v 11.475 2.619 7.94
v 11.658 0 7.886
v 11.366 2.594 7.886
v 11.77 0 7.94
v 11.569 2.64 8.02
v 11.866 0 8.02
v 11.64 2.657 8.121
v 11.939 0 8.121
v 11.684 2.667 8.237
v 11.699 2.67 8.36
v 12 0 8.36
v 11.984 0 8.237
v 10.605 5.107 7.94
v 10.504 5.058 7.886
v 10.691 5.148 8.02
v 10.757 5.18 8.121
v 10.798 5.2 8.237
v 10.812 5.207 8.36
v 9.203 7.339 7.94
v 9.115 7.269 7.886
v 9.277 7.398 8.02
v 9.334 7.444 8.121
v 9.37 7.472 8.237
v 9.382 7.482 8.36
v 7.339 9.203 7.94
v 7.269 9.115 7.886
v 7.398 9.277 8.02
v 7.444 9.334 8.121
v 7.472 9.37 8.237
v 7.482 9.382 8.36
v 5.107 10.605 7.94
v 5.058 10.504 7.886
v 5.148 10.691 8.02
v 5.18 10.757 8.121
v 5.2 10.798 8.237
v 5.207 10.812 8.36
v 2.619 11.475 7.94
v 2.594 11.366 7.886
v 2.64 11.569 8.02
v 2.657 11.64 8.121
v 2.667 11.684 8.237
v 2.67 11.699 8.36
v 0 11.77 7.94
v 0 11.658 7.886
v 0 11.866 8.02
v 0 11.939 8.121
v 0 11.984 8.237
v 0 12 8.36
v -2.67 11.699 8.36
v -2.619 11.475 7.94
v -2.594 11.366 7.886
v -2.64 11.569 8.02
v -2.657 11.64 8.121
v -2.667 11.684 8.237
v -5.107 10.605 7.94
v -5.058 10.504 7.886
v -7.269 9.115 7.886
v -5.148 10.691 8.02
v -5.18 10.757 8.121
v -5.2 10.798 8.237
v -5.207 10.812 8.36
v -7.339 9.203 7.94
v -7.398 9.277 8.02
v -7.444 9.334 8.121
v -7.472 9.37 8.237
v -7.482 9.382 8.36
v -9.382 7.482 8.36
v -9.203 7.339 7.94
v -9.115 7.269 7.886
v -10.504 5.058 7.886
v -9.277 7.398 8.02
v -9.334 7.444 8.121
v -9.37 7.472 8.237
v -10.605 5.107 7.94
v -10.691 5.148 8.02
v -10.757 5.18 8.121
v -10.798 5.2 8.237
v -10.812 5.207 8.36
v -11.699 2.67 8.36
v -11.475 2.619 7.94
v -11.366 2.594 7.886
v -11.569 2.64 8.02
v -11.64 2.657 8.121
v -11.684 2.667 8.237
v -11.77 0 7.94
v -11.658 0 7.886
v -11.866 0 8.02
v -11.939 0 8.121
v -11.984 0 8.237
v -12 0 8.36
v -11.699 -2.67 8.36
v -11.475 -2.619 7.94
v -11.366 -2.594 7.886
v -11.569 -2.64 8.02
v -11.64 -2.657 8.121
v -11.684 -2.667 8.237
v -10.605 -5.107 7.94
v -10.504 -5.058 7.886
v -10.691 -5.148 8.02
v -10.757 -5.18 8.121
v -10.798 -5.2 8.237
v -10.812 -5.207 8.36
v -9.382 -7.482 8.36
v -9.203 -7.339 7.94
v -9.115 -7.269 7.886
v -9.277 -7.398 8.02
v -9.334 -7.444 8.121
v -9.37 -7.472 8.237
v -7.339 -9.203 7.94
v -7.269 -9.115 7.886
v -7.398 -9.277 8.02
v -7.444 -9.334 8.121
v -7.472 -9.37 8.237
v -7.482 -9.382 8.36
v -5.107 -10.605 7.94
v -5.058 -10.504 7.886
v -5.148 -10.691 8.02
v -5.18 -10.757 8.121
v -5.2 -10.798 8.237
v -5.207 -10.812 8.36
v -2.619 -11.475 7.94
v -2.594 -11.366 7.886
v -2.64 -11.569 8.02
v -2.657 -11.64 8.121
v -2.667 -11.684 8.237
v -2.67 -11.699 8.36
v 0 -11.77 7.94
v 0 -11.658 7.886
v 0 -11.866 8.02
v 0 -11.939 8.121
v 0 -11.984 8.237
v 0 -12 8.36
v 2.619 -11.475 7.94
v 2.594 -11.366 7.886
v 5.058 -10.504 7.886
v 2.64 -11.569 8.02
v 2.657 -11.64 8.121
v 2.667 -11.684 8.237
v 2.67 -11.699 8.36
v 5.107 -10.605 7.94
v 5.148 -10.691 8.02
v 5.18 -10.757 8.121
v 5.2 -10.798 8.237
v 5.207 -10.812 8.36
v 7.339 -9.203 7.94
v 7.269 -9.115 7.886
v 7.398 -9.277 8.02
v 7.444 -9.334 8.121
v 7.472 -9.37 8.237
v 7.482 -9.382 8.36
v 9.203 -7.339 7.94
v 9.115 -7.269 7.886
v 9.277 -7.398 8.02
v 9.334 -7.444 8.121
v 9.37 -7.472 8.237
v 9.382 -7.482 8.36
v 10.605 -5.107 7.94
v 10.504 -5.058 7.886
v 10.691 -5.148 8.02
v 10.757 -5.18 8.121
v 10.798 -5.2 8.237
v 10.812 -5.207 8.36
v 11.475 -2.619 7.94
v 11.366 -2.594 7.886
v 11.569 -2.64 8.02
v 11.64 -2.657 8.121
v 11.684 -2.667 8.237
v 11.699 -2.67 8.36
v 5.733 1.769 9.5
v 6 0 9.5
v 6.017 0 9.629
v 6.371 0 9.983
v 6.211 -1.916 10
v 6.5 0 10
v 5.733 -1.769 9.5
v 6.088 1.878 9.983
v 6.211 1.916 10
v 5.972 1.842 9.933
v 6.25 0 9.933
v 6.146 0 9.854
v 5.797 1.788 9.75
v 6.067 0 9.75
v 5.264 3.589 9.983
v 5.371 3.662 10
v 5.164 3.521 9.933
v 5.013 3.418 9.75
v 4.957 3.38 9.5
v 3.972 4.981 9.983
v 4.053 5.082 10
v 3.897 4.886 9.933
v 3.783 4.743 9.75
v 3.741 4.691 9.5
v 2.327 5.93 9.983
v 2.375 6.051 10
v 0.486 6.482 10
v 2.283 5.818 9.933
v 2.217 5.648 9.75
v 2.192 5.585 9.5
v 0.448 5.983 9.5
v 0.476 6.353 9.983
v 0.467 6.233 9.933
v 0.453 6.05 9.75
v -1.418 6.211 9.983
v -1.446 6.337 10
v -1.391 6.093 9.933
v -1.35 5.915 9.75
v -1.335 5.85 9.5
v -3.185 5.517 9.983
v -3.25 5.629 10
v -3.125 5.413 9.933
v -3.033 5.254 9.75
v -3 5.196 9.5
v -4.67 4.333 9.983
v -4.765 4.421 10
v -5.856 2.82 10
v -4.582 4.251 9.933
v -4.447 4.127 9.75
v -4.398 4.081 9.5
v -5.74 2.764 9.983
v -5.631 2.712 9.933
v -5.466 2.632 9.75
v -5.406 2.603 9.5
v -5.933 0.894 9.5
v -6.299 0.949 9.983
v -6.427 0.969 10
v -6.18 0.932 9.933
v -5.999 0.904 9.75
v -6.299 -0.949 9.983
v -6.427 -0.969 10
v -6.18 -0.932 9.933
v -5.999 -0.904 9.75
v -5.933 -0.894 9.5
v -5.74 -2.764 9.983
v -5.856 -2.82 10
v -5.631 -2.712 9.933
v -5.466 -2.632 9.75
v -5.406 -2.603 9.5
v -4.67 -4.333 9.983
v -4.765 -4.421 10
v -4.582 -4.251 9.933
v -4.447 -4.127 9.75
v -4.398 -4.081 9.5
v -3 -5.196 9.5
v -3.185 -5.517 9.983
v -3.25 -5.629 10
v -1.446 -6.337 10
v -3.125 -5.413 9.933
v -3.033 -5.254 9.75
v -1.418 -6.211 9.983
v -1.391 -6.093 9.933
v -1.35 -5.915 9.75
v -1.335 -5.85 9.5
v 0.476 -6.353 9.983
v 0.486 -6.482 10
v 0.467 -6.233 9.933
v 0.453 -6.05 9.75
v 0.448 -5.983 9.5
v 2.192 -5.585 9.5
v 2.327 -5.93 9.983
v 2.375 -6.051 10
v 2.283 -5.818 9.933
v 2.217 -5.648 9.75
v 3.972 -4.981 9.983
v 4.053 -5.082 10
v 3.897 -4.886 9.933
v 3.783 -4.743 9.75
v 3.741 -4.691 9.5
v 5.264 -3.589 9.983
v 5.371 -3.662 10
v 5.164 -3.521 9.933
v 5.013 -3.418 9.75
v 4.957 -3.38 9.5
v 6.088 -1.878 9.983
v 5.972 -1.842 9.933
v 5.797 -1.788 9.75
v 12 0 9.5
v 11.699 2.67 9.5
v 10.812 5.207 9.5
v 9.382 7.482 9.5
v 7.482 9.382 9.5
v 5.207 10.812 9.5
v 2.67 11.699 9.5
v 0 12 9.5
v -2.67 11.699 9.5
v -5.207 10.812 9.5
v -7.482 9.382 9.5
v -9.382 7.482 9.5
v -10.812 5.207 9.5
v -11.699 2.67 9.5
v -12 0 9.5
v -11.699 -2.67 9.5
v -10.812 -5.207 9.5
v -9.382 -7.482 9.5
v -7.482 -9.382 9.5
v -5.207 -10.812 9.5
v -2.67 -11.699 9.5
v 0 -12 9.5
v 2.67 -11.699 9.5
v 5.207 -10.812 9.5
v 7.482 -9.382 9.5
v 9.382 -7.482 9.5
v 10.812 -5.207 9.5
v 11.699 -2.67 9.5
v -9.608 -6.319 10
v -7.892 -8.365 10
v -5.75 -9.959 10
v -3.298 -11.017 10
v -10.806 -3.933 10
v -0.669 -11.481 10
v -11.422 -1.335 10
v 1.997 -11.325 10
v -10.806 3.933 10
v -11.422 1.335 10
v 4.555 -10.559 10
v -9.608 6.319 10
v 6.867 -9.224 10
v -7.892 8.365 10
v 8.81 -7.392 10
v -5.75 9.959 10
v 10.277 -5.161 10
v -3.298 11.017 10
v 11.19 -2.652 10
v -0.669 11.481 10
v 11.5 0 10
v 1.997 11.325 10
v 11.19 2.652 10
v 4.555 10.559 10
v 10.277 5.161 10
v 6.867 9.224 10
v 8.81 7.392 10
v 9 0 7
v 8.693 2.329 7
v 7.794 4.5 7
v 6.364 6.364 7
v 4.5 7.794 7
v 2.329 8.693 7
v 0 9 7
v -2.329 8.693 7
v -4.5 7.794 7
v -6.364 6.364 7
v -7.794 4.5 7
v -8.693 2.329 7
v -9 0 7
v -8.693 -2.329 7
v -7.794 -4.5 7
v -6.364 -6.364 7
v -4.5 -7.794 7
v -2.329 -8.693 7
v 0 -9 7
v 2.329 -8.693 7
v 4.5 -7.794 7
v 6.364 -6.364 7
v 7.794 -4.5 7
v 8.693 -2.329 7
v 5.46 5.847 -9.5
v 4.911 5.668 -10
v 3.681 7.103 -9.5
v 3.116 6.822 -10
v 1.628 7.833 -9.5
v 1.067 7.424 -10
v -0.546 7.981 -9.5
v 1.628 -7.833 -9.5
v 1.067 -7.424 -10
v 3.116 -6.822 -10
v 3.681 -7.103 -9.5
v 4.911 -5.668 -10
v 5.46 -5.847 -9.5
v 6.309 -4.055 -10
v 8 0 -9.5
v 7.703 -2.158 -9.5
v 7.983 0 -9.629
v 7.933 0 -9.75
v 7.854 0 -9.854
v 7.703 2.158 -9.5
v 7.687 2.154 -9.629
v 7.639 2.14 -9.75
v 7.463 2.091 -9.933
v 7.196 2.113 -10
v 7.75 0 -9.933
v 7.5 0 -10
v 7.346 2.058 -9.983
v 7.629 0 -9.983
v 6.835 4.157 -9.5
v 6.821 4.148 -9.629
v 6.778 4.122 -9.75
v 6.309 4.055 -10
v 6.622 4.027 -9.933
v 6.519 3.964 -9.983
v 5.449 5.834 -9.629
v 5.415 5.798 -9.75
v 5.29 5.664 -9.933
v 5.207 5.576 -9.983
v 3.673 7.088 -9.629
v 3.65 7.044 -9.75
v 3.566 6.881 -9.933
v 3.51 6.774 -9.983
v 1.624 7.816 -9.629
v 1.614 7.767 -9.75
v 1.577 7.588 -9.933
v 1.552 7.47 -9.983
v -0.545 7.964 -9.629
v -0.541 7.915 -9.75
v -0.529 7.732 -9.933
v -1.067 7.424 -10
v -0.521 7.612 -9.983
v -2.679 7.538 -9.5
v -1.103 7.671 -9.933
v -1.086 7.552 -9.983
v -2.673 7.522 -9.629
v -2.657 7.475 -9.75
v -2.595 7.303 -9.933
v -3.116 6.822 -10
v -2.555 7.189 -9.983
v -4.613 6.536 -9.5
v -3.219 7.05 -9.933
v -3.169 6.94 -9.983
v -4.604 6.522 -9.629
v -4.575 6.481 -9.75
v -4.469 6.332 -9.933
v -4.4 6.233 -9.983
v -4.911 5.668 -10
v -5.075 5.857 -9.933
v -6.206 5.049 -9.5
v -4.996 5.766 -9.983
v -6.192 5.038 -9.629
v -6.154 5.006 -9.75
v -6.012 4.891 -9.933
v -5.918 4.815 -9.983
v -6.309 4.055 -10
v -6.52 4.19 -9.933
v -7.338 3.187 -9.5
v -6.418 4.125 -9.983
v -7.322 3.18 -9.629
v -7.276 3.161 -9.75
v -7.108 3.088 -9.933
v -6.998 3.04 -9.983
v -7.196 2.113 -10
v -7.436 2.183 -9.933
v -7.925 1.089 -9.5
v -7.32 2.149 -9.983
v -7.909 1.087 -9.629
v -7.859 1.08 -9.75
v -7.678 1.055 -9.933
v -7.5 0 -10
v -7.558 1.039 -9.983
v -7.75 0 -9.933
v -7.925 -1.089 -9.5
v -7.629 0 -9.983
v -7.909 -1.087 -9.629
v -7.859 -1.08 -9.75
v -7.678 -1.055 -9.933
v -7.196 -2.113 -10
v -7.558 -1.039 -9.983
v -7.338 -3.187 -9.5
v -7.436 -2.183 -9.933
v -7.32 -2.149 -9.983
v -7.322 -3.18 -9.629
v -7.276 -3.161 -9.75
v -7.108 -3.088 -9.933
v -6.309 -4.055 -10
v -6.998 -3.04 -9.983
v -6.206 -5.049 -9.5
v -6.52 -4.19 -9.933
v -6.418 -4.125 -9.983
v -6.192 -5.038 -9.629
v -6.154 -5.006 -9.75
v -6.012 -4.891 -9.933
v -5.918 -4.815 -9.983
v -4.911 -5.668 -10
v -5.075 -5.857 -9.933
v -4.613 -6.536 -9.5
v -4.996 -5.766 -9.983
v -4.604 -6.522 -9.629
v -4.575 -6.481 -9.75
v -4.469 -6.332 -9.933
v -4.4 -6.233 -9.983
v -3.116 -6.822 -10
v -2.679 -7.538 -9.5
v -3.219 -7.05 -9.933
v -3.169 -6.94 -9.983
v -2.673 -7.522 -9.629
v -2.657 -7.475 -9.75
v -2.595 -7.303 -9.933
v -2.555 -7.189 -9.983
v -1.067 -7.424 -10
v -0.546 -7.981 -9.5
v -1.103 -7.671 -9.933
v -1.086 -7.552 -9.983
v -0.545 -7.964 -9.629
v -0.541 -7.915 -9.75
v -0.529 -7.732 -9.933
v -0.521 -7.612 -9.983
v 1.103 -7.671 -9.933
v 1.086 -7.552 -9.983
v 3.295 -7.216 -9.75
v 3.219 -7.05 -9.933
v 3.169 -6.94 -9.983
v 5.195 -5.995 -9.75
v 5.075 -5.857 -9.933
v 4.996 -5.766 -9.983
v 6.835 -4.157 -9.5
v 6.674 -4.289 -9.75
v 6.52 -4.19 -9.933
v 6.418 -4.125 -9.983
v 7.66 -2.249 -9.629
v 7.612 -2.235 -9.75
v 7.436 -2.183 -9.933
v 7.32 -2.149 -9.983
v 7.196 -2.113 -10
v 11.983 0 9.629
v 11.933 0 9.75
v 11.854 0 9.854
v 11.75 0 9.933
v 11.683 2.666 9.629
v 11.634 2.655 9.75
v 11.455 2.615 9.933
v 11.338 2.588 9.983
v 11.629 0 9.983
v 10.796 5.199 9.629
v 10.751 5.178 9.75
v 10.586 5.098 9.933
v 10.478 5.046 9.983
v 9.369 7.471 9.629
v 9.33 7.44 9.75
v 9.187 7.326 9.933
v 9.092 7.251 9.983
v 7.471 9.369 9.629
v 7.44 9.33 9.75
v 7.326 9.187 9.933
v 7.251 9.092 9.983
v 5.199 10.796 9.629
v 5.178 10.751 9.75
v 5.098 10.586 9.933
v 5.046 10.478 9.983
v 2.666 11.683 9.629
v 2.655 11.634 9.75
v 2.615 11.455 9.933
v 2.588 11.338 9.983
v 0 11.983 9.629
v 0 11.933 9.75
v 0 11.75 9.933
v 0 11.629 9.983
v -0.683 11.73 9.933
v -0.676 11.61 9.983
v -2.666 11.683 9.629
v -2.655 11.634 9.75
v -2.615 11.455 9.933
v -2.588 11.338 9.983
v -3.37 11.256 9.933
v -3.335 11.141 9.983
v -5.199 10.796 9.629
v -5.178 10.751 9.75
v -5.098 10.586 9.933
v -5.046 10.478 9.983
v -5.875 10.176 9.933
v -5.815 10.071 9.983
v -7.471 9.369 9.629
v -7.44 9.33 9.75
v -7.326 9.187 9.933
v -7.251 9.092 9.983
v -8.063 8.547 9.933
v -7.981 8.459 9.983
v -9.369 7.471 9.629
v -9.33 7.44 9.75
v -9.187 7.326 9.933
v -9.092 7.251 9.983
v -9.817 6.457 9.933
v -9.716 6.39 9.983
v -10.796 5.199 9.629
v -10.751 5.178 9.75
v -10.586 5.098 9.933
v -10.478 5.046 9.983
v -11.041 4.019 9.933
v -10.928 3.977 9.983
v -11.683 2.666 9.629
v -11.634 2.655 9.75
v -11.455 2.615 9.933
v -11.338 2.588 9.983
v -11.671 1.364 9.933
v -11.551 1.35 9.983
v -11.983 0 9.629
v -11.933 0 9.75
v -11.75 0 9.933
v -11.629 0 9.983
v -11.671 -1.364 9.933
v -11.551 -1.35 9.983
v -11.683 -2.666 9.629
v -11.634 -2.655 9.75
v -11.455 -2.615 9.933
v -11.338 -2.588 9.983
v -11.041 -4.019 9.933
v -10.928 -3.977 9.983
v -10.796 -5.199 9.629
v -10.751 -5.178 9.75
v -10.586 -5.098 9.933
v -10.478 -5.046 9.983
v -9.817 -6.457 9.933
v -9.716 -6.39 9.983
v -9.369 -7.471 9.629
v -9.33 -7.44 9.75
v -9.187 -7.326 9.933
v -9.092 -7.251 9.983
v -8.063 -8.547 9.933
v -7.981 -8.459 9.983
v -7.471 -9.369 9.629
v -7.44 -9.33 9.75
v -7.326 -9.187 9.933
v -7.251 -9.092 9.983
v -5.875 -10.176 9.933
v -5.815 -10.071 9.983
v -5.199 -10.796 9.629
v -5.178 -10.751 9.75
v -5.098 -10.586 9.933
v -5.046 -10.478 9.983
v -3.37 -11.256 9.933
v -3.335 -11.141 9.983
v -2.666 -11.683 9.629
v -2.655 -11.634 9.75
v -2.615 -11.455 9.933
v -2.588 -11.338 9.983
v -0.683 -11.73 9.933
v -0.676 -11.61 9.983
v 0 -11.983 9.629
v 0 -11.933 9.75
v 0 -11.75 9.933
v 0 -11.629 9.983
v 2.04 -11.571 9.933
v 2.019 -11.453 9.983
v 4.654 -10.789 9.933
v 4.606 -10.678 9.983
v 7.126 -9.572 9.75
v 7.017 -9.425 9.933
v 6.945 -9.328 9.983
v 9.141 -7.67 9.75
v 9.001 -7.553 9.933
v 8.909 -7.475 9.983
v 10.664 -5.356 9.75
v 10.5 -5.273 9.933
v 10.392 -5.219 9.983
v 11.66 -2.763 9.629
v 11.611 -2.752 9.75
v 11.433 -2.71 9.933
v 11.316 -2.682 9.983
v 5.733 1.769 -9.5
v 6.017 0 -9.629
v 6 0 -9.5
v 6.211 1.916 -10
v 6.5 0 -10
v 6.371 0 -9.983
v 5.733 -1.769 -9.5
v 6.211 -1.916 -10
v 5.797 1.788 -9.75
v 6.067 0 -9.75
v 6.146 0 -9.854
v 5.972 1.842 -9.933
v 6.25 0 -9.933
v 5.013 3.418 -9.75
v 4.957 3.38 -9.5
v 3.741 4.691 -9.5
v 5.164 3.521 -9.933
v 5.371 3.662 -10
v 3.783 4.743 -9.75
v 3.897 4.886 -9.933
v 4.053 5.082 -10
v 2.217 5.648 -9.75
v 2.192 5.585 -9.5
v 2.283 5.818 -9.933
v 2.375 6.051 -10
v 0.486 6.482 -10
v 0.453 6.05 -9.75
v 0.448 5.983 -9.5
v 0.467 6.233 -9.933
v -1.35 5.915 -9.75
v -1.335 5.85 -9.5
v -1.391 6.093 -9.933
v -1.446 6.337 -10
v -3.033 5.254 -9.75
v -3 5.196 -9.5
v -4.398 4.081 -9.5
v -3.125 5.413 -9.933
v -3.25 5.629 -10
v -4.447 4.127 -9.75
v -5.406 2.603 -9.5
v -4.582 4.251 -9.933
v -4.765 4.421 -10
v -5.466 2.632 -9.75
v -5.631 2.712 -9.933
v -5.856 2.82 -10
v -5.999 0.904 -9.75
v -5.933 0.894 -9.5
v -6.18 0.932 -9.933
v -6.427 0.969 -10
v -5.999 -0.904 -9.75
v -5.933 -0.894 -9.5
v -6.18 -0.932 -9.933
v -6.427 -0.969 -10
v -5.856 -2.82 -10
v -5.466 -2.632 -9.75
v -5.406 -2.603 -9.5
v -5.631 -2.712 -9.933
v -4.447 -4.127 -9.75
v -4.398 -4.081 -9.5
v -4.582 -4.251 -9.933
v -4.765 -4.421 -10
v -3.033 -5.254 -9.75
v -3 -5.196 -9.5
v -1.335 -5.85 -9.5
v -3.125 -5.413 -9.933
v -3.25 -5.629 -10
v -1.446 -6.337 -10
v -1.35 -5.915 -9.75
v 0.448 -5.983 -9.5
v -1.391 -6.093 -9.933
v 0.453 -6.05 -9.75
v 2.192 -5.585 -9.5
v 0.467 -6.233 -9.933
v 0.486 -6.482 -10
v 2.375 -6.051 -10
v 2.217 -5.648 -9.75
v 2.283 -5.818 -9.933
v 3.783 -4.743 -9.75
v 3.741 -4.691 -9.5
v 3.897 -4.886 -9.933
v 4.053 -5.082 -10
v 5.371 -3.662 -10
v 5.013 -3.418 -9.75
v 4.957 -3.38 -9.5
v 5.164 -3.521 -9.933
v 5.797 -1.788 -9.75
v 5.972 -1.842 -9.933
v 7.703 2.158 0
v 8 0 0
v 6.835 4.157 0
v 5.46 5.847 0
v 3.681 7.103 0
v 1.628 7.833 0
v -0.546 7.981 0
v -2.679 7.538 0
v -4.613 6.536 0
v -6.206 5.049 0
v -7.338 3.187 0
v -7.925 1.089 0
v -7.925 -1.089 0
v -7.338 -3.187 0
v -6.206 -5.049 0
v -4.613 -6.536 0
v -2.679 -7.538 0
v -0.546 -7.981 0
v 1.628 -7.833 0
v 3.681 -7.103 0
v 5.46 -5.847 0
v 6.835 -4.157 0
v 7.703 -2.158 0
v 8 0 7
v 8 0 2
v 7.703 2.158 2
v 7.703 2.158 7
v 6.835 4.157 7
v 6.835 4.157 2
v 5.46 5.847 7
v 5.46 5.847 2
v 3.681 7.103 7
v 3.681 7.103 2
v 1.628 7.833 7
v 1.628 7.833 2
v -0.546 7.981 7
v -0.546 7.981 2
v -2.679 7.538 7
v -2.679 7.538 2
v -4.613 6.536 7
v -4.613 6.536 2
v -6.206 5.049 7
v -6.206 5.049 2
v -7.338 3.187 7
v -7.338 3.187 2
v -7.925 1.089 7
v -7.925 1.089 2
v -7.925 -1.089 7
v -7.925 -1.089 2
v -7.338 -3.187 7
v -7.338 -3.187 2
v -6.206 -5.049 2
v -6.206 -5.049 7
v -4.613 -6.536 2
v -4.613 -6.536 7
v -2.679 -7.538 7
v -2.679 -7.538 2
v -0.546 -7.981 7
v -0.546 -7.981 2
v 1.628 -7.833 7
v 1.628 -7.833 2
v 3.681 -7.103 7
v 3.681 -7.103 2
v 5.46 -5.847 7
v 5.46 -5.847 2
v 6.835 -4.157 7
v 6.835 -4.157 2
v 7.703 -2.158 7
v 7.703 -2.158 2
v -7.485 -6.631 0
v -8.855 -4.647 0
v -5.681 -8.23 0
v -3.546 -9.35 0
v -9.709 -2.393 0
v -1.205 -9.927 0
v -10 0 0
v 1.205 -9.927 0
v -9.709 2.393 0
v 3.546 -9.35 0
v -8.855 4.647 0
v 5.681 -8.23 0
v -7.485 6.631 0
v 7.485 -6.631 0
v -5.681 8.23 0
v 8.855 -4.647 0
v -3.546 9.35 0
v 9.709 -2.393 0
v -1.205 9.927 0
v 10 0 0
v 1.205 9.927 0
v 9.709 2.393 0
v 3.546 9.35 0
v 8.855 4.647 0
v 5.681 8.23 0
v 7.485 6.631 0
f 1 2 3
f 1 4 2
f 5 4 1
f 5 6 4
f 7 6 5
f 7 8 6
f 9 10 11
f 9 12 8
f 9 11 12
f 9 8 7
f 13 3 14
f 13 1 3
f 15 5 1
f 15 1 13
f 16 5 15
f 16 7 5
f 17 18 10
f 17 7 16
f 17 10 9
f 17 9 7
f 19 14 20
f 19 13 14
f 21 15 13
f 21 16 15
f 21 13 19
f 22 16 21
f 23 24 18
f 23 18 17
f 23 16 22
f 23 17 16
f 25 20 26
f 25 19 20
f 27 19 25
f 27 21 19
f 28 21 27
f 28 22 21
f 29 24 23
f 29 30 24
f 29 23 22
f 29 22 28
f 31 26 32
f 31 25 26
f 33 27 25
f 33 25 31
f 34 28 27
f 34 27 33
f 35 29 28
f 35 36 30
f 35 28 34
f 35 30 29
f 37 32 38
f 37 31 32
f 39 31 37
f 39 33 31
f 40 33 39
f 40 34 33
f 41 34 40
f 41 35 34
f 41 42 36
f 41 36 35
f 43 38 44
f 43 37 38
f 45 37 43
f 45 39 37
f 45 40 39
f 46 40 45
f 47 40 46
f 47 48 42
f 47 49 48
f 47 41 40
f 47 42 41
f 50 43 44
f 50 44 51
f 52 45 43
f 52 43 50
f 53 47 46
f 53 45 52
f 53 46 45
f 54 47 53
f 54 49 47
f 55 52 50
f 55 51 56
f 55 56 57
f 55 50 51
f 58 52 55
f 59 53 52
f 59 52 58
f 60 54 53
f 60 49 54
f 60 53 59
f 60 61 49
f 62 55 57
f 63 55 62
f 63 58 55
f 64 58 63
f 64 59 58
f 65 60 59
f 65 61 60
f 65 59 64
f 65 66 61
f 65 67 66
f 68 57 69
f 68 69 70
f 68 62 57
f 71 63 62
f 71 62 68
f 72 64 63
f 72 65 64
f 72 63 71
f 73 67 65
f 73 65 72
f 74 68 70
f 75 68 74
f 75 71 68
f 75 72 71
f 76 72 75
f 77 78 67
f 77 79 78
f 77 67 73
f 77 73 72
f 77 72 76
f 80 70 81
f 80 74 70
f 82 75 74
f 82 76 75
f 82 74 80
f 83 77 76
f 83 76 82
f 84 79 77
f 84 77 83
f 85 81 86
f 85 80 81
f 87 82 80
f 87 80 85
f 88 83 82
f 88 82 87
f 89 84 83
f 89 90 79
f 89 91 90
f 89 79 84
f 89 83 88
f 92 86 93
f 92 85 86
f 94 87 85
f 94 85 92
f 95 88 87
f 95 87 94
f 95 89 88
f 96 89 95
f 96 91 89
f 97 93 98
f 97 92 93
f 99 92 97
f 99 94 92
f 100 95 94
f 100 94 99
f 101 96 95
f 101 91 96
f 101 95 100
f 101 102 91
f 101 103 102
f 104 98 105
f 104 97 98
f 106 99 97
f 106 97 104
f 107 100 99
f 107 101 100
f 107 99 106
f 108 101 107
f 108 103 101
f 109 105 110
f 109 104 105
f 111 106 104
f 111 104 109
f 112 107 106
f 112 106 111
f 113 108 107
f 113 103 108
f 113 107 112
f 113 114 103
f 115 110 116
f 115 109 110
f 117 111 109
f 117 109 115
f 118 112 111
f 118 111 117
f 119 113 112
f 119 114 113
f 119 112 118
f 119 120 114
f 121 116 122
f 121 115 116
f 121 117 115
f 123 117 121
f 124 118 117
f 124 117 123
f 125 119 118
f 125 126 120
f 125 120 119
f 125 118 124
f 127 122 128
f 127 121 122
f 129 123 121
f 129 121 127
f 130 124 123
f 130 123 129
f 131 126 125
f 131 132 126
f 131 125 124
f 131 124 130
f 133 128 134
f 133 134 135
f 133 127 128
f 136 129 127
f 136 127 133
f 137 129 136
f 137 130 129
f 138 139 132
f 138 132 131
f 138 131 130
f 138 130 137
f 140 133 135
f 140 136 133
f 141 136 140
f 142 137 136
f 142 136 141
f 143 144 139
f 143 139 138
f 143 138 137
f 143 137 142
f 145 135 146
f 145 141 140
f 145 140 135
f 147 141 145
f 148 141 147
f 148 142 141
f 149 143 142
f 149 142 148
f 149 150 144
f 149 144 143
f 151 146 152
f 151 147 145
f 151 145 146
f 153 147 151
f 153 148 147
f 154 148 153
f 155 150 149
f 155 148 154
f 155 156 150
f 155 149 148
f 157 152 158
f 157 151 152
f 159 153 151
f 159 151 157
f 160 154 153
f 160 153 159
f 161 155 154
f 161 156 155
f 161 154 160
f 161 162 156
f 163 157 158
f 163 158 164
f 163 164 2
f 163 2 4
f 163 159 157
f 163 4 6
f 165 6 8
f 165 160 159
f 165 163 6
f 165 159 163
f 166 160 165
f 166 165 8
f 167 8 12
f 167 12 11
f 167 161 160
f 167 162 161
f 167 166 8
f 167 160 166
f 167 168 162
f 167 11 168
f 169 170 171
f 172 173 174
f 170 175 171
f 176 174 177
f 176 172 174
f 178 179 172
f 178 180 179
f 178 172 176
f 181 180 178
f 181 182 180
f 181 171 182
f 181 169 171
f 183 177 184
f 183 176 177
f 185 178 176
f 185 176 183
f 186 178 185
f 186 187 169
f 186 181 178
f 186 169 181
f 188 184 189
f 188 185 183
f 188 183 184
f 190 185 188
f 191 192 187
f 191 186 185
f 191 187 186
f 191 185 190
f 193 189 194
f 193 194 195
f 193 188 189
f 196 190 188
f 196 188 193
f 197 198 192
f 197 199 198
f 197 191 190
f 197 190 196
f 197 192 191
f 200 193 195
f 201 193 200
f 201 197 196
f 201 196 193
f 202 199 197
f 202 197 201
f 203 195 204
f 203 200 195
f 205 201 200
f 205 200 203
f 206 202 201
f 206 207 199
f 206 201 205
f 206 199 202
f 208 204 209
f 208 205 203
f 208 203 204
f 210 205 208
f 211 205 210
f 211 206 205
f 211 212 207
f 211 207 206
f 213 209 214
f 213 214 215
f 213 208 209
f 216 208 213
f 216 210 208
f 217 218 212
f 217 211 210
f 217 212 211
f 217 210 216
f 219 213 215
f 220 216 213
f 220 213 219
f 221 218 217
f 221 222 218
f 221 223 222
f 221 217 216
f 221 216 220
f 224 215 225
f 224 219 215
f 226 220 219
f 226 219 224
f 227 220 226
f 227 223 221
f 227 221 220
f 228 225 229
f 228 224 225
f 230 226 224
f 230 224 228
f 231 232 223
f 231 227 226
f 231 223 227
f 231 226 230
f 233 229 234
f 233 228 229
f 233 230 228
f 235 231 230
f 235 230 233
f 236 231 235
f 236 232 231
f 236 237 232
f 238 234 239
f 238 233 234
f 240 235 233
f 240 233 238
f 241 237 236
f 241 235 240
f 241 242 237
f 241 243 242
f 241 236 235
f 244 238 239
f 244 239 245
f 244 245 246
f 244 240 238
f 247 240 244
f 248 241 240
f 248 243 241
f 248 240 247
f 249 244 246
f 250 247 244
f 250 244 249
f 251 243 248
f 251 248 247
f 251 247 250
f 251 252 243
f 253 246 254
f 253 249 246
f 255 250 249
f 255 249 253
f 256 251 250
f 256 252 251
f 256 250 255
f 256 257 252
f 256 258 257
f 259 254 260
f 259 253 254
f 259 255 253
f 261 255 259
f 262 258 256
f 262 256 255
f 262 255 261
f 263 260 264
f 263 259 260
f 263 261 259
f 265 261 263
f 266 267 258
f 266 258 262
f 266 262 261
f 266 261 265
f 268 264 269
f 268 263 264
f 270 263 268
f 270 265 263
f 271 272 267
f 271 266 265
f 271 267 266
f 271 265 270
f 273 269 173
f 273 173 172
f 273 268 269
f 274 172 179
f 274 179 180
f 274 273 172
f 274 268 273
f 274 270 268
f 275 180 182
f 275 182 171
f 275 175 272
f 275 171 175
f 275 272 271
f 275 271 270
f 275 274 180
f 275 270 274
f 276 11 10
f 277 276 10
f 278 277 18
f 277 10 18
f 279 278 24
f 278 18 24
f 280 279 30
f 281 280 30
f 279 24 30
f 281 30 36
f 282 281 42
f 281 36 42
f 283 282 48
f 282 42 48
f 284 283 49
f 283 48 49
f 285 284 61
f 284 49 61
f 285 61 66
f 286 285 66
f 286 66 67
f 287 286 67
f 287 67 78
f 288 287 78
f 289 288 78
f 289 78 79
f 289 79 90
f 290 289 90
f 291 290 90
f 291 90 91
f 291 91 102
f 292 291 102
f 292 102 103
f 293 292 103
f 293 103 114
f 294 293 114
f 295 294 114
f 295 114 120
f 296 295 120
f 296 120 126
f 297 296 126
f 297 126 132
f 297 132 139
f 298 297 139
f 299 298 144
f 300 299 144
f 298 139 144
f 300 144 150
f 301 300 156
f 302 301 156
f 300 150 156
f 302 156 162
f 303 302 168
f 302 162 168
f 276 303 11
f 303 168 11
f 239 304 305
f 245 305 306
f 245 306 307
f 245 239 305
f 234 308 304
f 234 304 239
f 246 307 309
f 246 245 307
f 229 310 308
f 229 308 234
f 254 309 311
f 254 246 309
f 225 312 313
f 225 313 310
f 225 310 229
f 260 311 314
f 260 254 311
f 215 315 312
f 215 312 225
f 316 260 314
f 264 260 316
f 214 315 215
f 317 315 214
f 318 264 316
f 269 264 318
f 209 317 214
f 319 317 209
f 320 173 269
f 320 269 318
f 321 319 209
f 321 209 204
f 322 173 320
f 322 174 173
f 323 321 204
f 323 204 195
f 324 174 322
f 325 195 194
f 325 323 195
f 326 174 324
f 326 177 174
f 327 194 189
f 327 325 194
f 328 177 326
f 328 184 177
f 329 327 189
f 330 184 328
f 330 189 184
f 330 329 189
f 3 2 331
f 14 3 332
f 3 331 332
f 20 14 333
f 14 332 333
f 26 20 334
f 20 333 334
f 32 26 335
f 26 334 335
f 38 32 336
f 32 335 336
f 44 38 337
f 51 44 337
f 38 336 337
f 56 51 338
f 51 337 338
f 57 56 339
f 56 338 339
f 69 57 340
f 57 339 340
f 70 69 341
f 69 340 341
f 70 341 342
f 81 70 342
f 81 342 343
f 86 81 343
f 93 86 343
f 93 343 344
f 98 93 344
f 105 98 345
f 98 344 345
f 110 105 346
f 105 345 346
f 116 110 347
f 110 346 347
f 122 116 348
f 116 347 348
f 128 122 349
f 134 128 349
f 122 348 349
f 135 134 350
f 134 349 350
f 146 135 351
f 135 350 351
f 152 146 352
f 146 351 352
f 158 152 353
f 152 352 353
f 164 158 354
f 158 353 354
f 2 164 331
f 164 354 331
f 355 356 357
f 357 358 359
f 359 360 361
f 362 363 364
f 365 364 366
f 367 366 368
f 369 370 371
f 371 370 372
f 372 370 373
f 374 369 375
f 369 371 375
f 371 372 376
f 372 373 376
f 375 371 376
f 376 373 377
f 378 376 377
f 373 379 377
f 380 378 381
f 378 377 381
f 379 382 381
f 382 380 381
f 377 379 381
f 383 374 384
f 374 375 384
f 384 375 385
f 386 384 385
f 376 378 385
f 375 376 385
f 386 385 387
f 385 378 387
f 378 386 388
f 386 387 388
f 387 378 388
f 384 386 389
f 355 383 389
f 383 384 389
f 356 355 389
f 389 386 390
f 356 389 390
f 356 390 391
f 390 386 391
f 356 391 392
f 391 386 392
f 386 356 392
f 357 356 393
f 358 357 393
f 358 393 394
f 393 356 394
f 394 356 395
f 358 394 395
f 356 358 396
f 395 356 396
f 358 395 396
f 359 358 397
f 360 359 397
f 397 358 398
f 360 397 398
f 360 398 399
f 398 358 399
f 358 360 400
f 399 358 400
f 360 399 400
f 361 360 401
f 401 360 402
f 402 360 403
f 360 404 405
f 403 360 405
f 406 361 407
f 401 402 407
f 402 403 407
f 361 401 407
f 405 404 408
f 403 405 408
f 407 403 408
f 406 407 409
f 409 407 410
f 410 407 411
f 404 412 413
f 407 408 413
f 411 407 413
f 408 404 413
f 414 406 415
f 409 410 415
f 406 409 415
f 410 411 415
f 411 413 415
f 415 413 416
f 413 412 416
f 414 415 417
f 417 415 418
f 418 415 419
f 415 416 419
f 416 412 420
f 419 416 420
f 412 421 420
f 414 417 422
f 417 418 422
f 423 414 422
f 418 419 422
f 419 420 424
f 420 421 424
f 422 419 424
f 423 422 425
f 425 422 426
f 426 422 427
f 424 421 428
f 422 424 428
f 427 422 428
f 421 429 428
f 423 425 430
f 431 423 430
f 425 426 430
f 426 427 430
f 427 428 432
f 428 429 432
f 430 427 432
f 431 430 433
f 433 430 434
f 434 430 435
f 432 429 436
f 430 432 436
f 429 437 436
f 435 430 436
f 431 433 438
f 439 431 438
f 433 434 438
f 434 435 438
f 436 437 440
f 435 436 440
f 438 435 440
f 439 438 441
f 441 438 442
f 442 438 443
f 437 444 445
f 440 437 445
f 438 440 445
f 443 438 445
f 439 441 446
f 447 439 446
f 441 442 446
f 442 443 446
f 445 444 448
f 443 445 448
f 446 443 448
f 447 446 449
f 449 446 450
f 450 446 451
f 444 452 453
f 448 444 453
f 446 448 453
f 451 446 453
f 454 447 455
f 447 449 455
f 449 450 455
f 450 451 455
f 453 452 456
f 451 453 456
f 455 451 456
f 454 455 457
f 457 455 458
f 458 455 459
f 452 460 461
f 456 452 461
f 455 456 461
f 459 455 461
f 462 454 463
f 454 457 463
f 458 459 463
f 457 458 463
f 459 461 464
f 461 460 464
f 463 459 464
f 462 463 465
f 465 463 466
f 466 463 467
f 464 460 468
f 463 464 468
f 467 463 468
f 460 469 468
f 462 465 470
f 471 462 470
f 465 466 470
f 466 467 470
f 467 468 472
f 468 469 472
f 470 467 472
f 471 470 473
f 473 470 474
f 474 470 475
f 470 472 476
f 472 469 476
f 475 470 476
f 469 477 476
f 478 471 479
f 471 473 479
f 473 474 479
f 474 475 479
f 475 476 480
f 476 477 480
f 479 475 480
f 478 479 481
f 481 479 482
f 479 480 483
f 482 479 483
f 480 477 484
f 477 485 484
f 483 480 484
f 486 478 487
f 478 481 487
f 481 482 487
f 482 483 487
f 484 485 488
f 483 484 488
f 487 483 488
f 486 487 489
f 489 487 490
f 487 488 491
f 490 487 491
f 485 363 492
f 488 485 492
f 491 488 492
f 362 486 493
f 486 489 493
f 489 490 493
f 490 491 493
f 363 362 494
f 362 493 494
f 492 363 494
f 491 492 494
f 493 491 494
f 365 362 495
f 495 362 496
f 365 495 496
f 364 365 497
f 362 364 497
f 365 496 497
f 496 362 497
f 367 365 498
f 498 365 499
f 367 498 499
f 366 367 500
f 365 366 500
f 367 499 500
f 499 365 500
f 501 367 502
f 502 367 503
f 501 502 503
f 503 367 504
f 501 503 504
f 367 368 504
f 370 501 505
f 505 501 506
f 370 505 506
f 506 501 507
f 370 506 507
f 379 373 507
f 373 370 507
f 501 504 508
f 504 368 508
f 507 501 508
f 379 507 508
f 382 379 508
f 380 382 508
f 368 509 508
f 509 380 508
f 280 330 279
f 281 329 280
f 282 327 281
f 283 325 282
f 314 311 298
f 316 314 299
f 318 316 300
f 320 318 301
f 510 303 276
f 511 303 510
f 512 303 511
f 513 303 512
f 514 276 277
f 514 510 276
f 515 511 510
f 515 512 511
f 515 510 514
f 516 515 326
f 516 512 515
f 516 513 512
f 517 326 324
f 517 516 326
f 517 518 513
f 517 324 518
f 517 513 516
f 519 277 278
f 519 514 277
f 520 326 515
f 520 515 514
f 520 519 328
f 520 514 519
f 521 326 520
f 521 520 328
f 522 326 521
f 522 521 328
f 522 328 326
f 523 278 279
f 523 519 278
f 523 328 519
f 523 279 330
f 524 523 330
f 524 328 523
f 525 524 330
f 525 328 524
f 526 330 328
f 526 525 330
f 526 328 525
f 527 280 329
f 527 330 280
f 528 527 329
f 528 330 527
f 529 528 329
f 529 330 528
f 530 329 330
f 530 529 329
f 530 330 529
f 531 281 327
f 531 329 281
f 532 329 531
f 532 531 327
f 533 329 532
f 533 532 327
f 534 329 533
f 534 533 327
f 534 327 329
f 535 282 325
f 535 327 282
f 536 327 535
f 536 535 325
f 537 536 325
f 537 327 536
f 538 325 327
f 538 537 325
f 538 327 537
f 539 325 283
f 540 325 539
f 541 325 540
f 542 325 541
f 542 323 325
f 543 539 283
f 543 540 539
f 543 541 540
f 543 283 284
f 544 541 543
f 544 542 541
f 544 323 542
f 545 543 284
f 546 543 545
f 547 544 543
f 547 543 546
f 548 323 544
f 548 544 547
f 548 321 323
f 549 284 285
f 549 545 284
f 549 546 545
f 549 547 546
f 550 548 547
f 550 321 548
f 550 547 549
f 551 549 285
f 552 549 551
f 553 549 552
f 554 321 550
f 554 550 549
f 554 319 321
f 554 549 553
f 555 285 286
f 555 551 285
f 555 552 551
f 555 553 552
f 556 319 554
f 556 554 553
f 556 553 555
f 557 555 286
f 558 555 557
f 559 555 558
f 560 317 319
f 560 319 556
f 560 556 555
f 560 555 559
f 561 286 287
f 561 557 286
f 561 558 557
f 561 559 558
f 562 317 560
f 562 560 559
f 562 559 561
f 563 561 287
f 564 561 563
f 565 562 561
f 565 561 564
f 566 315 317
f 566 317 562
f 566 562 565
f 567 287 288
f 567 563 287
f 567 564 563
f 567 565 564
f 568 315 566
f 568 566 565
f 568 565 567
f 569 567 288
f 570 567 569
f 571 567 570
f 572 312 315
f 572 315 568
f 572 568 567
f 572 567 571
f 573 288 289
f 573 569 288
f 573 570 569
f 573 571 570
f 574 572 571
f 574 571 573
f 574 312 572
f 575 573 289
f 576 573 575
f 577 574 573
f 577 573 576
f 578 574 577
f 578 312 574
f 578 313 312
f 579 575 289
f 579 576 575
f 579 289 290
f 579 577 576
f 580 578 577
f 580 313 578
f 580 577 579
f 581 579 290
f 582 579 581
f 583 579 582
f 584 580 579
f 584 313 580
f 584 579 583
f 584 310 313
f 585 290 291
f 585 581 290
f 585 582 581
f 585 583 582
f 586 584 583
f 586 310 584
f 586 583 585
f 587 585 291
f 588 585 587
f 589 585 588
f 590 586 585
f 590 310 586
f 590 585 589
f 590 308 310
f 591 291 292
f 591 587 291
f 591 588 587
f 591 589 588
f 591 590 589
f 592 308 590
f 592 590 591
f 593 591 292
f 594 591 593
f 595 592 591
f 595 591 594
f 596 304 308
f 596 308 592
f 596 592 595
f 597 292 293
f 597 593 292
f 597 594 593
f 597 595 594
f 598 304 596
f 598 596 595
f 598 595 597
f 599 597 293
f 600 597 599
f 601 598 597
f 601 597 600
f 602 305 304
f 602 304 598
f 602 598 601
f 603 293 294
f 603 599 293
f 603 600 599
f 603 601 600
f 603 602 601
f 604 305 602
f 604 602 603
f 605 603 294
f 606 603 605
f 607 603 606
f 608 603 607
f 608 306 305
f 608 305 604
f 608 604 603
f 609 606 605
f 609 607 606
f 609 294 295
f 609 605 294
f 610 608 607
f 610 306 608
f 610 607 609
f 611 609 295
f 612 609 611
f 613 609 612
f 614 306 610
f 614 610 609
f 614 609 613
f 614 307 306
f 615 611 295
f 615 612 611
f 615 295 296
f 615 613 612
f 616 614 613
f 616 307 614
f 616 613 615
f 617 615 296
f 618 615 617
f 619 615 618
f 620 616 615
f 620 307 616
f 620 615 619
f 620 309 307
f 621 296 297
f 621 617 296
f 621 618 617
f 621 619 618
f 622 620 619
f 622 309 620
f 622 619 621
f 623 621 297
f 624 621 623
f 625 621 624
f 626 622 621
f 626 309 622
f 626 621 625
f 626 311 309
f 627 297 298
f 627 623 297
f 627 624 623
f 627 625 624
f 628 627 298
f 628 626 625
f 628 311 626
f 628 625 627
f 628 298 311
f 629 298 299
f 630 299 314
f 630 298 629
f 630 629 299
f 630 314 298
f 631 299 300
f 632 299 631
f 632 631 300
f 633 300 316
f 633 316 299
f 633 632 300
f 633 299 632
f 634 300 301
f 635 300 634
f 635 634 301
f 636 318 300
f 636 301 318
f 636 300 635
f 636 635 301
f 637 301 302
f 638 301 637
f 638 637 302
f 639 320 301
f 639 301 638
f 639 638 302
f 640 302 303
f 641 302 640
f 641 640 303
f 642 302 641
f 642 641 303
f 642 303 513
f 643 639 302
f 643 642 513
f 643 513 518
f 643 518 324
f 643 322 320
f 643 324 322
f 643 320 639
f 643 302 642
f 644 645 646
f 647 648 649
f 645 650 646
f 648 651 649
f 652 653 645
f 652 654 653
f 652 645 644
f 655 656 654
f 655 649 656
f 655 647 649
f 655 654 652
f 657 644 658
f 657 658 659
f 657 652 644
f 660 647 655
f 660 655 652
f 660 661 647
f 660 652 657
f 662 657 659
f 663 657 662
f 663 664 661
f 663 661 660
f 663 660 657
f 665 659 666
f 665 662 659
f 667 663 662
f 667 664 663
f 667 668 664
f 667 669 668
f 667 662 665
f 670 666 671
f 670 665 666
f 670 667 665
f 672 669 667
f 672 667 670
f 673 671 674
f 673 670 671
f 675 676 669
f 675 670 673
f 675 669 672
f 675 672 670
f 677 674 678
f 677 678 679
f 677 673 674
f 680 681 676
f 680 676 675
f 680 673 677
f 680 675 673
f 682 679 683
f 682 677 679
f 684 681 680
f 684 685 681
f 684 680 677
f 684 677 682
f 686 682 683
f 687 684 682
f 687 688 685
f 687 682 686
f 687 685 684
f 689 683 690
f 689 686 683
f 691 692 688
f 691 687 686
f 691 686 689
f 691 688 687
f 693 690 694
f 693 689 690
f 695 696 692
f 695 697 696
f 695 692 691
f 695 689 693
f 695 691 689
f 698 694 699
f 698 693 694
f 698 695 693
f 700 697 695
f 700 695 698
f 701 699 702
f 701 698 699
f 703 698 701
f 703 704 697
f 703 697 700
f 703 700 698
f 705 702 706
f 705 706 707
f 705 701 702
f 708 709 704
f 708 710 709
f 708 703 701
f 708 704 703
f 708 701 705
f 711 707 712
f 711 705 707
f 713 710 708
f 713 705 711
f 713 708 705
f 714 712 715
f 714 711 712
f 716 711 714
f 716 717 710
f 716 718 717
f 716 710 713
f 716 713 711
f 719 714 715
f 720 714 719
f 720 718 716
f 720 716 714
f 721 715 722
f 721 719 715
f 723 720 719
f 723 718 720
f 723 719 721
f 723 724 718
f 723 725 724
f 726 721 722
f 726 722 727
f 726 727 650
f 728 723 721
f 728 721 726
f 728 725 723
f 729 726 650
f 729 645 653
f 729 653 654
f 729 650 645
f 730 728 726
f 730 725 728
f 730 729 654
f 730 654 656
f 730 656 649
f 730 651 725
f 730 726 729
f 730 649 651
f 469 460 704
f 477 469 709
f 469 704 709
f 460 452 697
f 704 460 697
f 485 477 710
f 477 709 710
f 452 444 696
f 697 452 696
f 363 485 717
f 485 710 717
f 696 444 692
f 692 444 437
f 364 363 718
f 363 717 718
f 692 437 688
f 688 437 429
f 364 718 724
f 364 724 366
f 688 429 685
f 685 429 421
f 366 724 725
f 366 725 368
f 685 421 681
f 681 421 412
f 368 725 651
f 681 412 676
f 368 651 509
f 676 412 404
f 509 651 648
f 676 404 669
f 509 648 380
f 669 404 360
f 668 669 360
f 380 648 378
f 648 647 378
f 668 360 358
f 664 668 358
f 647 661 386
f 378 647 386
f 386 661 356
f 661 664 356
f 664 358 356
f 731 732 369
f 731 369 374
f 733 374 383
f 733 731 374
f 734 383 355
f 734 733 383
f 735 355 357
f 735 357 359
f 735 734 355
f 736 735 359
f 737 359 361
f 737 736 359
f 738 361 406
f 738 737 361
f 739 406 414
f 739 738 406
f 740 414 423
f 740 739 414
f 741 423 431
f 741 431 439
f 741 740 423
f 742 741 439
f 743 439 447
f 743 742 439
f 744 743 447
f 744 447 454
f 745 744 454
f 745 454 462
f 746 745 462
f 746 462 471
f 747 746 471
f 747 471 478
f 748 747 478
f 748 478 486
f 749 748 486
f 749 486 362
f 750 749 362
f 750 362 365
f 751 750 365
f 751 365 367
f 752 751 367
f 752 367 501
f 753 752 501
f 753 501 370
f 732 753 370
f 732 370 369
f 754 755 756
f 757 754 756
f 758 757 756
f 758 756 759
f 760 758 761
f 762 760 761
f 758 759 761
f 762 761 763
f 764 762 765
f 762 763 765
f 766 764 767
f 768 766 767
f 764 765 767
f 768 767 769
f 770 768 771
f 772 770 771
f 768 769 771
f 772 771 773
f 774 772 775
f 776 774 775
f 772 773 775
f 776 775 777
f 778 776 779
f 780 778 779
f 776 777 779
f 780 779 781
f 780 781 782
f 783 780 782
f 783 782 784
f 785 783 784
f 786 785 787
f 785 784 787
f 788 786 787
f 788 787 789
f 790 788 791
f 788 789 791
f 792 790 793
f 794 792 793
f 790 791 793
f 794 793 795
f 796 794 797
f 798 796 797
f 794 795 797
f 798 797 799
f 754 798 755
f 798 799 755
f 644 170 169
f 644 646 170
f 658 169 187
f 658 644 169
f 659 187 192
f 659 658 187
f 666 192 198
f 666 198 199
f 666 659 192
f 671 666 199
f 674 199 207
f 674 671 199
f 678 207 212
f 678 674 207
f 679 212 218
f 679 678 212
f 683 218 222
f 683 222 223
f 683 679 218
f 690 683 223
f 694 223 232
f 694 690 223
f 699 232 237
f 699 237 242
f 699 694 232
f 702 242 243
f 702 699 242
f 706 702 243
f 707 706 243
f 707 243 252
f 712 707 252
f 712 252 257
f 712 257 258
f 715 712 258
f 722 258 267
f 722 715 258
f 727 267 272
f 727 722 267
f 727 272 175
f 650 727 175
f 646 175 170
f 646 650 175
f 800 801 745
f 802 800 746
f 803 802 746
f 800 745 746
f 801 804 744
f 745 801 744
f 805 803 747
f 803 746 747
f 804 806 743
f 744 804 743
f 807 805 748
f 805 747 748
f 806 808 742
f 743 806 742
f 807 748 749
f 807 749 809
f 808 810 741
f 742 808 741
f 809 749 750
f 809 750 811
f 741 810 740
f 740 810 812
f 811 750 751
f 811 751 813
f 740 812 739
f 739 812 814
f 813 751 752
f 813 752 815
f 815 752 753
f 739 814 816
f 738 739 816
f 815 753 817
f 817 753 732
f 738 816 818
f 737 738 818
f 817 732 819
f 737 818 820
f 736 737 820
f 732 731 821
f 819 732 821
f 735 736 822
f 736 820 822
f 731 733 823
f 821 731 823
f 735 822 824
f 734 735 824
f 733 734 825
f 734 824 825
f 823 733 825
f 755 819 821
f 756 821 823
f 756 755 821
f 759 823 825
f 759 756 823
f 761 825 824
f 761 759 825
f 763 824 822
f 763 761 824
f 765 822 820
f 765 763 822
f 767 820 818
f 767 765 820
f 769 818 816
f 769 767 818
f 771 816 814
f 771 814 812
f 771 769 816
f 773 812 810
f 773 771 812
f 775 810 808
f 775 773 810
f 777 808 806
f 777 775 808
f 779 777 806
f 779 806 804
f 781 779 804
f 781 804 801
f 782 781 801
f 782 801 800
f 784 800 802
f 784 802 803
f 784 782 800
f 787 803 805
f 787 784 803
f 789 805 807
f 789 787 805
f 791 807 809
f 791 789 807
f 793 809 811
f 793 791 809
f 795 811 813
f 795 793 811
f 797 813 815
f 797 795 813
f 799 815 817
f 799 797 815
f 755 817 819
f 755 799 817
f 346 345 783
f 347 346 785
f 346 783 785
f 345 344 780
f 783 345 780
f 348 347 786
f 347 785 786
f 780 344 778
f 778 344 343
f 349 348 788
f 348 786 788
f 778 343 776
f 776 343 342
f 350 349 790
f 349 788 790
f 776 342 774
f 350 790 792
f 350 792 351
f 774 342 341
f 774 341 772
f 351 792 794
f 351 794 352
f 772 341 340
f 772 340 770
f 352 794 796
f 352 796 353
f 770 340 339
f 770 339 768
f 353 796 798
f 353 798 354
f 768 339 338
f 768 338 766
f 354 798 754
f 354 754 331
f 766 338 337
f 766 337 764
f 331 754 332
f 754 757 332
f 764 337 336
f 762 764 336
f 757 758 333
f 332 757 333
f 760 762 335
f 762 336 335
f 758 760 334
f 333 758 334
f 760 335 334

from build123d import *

# Parameters (mm, degrees)
F0_R     = 8
F0_R_2   = 6
F1_DEPTH = 10
F2_R     = 10
F2_R_2   = 6
F3_DEPTH = 2
F4_R     = 8
F4_R_2   = 6
F5_DEPTH = 5
F6_R     = 12
F6_R_2   = 6
F7_DEPTH = 3
F8_SIZE  = 1.99999
F9_SIZE2 = 3
F9_SIZE  = 1


# Not quite as in the source:
# - a fillet or chamfer that OpenCascade refuses, or shapes differently, is made with other operations: its cross-section is extruded or revolved along the edge and cut away or added
# - a fillet or chamfer is up to 0.001 mm smaller than in the source, because OpenCascade refuses the exact size


with BuildPart() as f1:
    # F0 (on Top) → F1 (new body)
    with BuildSketch(Plane.XY):
        Circle(F0_R)
        Circle(F0_R_2, mode=Mode.SUBTRACT)
    extrude(amount=-F1_DEPTH)

    # F2 (on Top) → F3 (join)
    with BuildSketch(Plane.XY):
        Circle(F2_R)
        Circle(F2_R_2, mode=Mode.SUBTRACT)
    extrude(amount=F3_DEPTH)

    # F4 (on face) → F5 (join)
    with BuildSketch(Plane.XY.offset(2)):
        Circle(F4_R)
        Circle(F4_R_2, mode=Mode.SUBTRACT)
    extrude(amount=F5_DEPTH)

    # F6 (on face) → F7 (join)
    with BuildSketch(Plane.XY.offset(7)):
        Circle(F6_R)
        Circle(F6_R_2, mode=Mode.SUBTRACT)
    extrude(amount=F7_DEPTH)

    # F8 (size 2 in the source; OpenCascade refuses exactly that, so slightly less here)
    f8_edges = [f1.edges().sort_by_distance(p)[0] for p in [
        (-10, 0, 2),
    ]]
    chamfer(f8_edges, length=F8_SIZE)

    # F9
    f9_edges = [f1.edges().sort_by_distance(p)[0] for p in [
        (-12, 0, 7),
    ]]
    f9_side = f1.faces().sort_by_distance((-12, 0, 8.5))[0]
    chamfer(f9_edges, length=F9_SIZE, length2=F9_SIZE2, reference=f9_side)

    # F10: fillet of radius 0.5 on 13 edges, made by hand

    # F10_s1 → F10_t2 (revolve, cut)
    with BuildSketch(Plane.XZ):
        with BuildLine():
            ThreePointArc((11.658113883, 7.886037961), (11.9056210926, 8.0680244677), (12, 8.36037961))
            Line((12, 8.36037961), (12, 8))
            Line((12, 8), (11.658113883, 7.886037961))
        make_face()
    revolve(axis=Axis((0, 0, 8), (0, 0, 1)), mode=Mode.SUBTRACT)

    # F10_s3 → F10_t4 (revolve, cut)
    with BuildSketch(Plane.XZ):
        with BuildLine():
            ThreePointArc((12, 9.5), (11.8535533906, 9.8535533906), (11.5, 10))
            Line((11.5, 10), (12, 10))
            Line((12, 10), (12, 9.5))
        make_face()
    revolve(axis=Axis((0, 0, 10), (0, 0, 1)), mode=Mode.SUBTRACT)

    # F10_s5 → F10_t6 (revolve, cut)
    with BuildSketch(Plane.XZ):
        with BuildLine():
            ThreePointArc((6, -9.5), (6.1464466094, -9.8535533906), (6.5, -10))
            Line((6.5, -10), (6, -10))
            Line((6, -10), (6, -9.5))
        make_face()
    revolve(axis=Axis((0, 0, -10), (0, 0, 1)), mode=Mode.SUBTRACT)

    # F10_s7 → F10_t8 (revolve, cut)
    with BuildSketch(Plane.XZ):
        with BuildLine():
            ThreePointArc((6.5, 10), (6.1464466094, 9.8535533906), (6, 9.5))
            Line((6, 9.5), (6, 10))
            Line((6, 10), (6.5, 10))
        make_face()
    revolve(axis=Axis((0, 0, 10), (0, 0, 1)), mode=Mode.SUBTRACT)

    # F10_s9 → F10_t10 (revolve, cut)
    with BuildSketch(Plane.XZ):
        with BuildLine():
            ThreePointArc((8, -9.5), (7.8535533906, -9.8535533906), (7.5, -10))
            Line((7.5, -10), (8, -10))
            Line((8, -10), (8, -9.5))
        make_face()
    revolve(axis=Axis((0, 0, -10), (0, 0, 1)), mode=Mode.SUBTRACT)


solid = f1.part
